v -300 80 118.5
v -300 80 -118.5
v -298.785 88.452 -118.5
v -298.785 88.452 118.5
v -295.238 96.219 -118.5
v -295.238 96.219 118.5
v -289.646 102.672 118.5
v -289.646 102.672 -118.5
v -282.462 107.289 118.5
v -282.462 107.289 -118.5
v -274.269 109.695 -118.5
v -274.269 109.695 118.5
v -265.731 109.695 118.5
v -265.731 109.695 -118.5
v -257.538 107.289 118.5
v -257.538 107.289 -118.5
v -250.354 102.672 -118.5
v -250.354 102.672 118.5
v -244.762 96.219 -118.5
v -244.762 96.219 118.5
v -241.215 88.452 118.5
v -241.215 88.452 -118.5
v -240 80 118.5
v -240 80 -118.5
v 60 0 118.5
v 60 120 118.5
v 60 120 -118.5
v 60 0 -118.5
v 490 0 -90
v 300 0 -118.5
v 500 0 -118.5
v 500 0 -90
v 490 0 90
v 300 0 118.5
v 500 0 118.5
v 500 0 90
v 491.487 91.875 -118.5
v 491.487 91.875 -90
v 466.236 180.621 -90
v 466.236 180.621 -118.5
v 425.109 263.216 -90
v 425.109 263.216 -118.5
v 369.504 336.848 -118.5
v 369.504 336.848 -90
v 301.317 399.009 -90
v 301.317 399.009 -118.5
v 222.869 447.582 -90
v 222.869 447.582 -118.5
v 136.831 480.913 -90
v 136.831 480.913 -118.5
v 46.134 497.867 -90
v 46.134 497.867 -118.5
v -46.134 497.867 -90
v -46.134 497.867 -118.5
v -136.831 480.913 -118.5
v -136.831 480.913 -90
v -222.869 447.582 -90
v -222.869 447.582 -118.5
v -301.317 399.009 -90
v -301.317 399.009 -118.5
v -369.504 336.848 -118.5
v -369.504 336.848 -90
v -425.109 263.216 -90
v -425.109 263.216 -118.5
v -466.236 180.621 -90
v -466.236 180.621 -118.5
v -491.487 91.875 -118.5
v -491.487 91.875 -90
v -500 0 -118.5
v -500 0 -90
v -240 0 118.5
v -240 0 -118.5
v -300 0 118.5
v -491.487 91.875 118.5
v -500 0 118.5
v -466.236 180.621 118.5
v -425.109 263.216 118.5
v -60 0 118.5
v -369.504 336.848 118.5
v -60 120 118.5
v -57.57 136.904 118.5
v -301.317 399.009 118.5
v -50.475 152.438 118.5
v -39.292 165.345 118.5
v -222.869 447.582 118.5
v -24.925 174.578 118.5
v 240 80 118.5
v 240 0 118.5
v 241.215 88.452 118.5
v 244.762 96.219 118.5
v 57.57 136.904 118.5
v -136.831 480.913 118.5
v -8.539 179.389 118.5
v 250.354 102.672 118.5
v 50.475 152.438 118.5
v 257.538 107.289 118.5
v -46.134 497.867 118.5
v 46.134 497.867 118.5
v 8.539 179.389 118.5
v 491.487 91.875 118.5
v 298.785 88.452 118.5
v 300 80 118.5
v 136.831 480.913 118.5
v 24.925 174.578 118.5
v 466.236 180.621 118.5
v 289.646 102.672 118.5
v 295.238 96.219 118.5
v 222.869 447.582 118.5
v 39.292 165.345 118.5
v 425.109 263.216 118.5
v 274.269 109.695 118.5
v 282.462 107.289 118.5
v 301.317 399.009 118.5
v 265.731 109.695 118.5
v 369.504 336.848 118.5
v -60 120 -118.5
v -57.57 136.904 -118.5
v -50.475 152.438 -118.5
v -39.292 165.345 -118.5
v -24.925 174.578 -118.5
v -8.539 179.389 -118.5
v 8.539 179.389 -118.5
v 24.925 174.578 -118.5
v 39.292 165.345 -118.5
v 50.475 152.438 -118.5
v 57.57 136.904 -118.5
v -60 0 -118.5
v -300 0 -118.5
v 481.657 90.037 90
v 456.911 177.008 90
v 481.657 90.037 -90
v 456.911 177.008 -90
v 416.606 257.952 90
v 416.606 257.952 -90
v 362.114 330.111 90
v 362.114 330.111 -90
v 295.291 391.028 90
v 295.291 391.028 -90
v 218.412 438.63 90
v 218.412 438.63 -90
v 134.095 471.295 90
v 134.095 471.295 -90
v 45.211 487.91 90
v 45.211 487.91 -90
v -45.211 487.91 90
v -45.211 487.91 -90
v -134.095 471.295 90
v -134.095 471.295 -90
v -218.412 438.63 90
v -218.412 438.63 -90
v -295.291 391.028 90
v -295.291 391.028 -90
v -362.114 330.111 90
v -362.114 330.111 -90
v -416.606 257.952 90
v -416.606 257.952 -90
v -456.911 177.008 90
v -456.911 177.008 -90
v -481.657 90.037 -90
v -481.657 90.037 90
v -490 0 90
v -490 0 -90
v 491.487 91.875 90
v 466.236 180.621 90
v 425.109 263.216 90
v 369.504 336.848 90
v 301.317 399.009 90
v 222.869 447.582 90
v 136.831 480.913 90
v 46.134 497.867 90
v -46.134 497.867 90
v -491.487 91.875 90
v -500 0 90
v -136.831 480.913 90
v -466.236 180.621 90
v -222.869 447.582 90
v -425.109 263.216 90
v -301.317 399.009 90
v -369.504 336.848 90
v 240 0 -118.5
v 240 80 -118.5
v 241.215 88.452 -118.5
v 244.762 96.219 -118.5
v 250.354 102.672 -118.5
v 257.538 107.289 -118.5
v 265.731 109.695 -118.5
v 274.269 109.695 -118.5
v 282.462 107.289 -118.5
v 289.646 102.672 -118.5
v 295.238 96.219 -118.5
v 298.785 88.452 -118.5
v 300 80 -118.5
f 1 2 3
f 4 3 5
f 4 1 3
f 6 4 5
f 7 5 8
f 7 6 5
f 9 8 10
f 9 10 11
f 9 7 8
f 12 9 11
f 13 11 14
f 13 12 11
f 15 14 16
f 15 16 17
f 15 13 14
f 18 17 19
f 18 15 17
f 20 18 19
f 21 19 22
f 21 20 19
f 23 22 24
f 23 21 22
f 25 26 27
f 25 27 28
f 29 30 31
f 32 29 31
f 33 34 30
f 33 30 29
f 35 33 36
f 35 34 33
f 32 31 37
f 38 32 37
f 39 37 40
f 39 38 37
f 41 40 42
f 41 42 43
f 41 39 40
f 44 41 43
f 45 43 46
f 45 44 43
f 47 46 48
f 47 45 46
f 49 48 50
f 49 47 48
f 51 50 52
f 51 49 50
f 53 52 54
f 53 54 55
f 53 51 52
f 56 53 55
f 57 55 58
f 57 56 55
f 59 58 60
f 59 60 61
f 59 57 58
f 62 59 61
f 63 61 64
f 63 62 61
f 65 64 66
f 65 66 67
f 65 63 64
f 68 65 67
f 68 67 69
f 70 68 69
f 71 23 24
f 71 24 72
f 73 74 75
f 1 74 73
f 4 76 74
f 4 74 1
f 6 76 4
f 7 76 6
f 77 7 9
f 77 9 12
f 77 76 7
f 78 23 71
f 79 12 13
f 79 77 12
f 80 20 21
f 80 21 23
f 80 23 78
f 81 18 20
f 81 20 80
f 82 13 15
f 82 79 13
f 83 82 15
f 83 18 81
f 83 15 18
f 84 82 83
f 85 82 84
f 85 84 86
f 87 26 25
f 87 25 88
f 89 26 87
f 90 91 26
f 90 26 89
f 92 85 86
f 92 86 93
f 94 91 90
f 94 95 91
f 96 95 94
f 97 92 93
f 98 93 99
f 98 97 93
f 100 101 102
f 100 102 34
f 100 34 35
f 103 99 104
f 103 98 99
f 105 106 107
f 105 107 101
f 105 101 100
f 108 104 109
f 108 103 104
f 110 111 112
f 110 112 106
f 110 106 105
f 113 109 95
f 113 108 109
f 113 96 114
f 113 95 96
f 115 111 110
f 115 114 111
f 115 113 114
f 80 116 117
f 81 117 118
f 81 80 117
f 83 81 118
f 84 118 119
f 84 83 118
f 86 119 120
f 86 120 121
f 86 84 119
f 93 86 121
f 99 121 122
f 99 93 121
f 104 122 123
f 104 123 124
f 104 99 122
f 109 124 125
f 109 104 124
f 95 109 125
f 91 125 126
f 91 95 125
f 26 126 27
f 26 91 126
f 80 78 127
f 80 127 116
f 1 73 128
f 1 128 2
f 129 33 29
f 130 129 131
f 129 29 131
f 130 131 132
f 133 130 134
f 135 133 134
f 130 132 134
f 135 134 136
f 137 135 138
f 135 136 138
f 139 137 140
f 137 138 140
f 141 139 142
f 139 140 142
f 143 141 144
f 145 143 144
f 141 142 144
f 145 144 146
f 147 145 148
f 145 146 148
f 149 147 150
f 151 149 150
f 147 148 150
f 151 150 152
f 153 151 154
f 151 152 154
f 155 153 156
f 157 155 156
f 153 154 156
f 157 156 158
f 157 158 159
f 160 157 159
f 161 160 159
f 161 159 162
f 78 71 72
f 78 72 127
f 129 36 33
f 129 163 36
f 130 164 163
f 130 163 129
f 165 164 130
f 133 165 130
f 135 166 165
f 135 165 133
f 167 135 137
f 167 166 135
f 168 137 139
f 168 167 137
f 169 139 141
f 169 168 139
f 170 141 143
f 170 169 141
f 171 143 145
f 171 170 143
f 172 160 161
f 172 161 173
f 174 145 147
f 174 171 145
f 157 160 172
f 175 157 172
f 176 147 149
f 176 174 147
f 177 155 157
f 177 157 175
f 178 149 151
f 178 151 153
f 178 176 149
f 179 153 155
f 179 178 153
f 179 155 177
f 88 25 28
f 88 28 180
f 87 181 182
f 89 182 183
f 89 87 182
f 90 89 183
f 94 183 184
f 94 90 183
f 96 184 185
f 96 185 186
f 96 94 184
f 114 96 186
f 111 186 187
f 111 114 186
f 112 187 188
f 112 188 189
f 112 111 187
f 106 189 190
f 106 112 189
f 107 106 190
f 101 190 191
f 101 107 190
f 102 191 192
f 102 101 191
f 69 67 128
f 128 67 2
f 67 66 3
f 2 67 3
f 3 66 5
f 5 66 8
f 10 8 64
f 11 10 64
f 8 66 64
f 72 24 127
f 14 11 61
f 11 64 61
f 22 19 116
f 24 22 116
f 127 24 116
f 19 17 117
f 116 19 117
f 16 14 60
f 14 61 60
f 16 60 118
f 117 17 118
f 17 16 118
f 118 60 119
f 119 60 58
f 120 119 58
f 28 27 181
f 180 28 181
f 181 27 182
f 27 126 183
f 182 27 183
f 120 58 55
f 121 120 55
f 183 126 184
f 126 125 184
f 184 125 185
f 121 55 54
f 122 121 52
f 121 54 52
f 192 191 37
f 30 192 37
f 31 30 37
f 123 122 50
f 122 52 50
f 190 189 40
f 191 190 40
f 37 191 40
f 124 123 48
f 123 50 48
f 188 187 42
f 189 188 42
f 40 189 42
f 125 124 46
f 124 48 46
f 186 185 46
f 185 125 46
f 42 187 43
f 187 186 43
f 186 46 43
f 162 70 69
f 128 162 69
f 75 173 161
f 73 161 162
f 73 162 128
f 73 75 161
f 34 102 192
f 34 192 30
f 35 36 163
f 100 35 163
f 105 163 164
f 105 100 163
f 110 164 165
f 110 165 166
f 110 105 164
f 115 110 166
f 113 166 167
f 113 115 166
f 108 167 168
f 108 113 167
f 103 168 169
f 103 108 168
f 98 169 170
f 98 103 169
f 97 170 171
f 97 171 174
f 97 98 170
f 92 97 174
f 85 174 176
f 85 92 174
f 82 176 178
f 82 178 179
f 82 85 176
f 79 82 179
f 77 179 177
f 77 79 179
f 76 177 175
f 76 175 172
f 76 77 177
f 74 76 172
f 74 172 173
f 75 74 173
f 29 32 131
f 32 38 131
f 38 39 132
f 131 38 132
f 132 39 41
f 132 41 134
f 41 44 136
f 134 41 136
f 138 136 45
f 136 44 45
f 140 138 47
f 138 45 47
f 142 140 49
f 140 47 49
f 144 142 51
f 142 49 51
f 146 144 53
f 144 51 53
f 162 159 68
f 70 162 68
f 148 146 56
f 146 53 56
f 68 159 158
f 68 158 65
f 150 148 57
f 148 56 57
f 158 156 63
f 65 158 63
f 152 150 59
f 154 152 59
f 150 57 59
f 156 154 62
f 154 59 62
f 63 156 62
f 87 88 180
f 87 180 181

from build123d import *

# Parameters (mm, degrees)
EXTRUDE_1_DEPTH     = 118.5
SKETCH_2_W          = 20
SKETCH_2_H          = 180
CUT_REVOLVE_1_ANGLE = 180


with BuildPart() as part:
    # 草图1 → 凸台-拉伸1 (new, symmetric)
    with BuildSketch(Plane.XY):
        with BuildLine():
            Line((-500, 0), (-300, 0))
            Line((-300, 0), (-300, 80))
            ThreePointArc((-300, 80), (-270, 110), (-240, 80))
            Line((-240, 80), (-240, 0))
            Line((-240, 0), (-60, 0))
            Line((-60, 0), (-60, 120))
            ThreePointArc((-60, 120), (0, 180), (60, 120))
            Line((60, 120), (60, 0))
            Line((60, 0), (240, 0))
            Line((240, 0), (240, 80))
            ThreePointArc((240, 80), (270, 110), (300, 80))
            Line((300, 80), (300, 0))
            Line((300, 0), (500, 0))
            ThreePointArc((500, 0), (0, 500), (-500, 0))
        make_face()
    extrude(amount=EXTRUDE_1_DEPTH, both=True)

    # 草图2 → 切除-旋转1 (revolve, cut)
    with BuildSketch(Plane(origin=(0, 0, 0), x_dir=(1, 0, 0), z_dir=(0, 1, 0))):
        with Locations((500, 0)):
            Rectangle(SKETCH_2_W, SKETCH_2_H)
    revolve(axis=Axis((0, 0, -254.401615848), (0, 0, 1)), revolution_arc=CUT_REVOLVE_1_ANGLE, mode=Mode.SUBTRACT)


solid = part.part
